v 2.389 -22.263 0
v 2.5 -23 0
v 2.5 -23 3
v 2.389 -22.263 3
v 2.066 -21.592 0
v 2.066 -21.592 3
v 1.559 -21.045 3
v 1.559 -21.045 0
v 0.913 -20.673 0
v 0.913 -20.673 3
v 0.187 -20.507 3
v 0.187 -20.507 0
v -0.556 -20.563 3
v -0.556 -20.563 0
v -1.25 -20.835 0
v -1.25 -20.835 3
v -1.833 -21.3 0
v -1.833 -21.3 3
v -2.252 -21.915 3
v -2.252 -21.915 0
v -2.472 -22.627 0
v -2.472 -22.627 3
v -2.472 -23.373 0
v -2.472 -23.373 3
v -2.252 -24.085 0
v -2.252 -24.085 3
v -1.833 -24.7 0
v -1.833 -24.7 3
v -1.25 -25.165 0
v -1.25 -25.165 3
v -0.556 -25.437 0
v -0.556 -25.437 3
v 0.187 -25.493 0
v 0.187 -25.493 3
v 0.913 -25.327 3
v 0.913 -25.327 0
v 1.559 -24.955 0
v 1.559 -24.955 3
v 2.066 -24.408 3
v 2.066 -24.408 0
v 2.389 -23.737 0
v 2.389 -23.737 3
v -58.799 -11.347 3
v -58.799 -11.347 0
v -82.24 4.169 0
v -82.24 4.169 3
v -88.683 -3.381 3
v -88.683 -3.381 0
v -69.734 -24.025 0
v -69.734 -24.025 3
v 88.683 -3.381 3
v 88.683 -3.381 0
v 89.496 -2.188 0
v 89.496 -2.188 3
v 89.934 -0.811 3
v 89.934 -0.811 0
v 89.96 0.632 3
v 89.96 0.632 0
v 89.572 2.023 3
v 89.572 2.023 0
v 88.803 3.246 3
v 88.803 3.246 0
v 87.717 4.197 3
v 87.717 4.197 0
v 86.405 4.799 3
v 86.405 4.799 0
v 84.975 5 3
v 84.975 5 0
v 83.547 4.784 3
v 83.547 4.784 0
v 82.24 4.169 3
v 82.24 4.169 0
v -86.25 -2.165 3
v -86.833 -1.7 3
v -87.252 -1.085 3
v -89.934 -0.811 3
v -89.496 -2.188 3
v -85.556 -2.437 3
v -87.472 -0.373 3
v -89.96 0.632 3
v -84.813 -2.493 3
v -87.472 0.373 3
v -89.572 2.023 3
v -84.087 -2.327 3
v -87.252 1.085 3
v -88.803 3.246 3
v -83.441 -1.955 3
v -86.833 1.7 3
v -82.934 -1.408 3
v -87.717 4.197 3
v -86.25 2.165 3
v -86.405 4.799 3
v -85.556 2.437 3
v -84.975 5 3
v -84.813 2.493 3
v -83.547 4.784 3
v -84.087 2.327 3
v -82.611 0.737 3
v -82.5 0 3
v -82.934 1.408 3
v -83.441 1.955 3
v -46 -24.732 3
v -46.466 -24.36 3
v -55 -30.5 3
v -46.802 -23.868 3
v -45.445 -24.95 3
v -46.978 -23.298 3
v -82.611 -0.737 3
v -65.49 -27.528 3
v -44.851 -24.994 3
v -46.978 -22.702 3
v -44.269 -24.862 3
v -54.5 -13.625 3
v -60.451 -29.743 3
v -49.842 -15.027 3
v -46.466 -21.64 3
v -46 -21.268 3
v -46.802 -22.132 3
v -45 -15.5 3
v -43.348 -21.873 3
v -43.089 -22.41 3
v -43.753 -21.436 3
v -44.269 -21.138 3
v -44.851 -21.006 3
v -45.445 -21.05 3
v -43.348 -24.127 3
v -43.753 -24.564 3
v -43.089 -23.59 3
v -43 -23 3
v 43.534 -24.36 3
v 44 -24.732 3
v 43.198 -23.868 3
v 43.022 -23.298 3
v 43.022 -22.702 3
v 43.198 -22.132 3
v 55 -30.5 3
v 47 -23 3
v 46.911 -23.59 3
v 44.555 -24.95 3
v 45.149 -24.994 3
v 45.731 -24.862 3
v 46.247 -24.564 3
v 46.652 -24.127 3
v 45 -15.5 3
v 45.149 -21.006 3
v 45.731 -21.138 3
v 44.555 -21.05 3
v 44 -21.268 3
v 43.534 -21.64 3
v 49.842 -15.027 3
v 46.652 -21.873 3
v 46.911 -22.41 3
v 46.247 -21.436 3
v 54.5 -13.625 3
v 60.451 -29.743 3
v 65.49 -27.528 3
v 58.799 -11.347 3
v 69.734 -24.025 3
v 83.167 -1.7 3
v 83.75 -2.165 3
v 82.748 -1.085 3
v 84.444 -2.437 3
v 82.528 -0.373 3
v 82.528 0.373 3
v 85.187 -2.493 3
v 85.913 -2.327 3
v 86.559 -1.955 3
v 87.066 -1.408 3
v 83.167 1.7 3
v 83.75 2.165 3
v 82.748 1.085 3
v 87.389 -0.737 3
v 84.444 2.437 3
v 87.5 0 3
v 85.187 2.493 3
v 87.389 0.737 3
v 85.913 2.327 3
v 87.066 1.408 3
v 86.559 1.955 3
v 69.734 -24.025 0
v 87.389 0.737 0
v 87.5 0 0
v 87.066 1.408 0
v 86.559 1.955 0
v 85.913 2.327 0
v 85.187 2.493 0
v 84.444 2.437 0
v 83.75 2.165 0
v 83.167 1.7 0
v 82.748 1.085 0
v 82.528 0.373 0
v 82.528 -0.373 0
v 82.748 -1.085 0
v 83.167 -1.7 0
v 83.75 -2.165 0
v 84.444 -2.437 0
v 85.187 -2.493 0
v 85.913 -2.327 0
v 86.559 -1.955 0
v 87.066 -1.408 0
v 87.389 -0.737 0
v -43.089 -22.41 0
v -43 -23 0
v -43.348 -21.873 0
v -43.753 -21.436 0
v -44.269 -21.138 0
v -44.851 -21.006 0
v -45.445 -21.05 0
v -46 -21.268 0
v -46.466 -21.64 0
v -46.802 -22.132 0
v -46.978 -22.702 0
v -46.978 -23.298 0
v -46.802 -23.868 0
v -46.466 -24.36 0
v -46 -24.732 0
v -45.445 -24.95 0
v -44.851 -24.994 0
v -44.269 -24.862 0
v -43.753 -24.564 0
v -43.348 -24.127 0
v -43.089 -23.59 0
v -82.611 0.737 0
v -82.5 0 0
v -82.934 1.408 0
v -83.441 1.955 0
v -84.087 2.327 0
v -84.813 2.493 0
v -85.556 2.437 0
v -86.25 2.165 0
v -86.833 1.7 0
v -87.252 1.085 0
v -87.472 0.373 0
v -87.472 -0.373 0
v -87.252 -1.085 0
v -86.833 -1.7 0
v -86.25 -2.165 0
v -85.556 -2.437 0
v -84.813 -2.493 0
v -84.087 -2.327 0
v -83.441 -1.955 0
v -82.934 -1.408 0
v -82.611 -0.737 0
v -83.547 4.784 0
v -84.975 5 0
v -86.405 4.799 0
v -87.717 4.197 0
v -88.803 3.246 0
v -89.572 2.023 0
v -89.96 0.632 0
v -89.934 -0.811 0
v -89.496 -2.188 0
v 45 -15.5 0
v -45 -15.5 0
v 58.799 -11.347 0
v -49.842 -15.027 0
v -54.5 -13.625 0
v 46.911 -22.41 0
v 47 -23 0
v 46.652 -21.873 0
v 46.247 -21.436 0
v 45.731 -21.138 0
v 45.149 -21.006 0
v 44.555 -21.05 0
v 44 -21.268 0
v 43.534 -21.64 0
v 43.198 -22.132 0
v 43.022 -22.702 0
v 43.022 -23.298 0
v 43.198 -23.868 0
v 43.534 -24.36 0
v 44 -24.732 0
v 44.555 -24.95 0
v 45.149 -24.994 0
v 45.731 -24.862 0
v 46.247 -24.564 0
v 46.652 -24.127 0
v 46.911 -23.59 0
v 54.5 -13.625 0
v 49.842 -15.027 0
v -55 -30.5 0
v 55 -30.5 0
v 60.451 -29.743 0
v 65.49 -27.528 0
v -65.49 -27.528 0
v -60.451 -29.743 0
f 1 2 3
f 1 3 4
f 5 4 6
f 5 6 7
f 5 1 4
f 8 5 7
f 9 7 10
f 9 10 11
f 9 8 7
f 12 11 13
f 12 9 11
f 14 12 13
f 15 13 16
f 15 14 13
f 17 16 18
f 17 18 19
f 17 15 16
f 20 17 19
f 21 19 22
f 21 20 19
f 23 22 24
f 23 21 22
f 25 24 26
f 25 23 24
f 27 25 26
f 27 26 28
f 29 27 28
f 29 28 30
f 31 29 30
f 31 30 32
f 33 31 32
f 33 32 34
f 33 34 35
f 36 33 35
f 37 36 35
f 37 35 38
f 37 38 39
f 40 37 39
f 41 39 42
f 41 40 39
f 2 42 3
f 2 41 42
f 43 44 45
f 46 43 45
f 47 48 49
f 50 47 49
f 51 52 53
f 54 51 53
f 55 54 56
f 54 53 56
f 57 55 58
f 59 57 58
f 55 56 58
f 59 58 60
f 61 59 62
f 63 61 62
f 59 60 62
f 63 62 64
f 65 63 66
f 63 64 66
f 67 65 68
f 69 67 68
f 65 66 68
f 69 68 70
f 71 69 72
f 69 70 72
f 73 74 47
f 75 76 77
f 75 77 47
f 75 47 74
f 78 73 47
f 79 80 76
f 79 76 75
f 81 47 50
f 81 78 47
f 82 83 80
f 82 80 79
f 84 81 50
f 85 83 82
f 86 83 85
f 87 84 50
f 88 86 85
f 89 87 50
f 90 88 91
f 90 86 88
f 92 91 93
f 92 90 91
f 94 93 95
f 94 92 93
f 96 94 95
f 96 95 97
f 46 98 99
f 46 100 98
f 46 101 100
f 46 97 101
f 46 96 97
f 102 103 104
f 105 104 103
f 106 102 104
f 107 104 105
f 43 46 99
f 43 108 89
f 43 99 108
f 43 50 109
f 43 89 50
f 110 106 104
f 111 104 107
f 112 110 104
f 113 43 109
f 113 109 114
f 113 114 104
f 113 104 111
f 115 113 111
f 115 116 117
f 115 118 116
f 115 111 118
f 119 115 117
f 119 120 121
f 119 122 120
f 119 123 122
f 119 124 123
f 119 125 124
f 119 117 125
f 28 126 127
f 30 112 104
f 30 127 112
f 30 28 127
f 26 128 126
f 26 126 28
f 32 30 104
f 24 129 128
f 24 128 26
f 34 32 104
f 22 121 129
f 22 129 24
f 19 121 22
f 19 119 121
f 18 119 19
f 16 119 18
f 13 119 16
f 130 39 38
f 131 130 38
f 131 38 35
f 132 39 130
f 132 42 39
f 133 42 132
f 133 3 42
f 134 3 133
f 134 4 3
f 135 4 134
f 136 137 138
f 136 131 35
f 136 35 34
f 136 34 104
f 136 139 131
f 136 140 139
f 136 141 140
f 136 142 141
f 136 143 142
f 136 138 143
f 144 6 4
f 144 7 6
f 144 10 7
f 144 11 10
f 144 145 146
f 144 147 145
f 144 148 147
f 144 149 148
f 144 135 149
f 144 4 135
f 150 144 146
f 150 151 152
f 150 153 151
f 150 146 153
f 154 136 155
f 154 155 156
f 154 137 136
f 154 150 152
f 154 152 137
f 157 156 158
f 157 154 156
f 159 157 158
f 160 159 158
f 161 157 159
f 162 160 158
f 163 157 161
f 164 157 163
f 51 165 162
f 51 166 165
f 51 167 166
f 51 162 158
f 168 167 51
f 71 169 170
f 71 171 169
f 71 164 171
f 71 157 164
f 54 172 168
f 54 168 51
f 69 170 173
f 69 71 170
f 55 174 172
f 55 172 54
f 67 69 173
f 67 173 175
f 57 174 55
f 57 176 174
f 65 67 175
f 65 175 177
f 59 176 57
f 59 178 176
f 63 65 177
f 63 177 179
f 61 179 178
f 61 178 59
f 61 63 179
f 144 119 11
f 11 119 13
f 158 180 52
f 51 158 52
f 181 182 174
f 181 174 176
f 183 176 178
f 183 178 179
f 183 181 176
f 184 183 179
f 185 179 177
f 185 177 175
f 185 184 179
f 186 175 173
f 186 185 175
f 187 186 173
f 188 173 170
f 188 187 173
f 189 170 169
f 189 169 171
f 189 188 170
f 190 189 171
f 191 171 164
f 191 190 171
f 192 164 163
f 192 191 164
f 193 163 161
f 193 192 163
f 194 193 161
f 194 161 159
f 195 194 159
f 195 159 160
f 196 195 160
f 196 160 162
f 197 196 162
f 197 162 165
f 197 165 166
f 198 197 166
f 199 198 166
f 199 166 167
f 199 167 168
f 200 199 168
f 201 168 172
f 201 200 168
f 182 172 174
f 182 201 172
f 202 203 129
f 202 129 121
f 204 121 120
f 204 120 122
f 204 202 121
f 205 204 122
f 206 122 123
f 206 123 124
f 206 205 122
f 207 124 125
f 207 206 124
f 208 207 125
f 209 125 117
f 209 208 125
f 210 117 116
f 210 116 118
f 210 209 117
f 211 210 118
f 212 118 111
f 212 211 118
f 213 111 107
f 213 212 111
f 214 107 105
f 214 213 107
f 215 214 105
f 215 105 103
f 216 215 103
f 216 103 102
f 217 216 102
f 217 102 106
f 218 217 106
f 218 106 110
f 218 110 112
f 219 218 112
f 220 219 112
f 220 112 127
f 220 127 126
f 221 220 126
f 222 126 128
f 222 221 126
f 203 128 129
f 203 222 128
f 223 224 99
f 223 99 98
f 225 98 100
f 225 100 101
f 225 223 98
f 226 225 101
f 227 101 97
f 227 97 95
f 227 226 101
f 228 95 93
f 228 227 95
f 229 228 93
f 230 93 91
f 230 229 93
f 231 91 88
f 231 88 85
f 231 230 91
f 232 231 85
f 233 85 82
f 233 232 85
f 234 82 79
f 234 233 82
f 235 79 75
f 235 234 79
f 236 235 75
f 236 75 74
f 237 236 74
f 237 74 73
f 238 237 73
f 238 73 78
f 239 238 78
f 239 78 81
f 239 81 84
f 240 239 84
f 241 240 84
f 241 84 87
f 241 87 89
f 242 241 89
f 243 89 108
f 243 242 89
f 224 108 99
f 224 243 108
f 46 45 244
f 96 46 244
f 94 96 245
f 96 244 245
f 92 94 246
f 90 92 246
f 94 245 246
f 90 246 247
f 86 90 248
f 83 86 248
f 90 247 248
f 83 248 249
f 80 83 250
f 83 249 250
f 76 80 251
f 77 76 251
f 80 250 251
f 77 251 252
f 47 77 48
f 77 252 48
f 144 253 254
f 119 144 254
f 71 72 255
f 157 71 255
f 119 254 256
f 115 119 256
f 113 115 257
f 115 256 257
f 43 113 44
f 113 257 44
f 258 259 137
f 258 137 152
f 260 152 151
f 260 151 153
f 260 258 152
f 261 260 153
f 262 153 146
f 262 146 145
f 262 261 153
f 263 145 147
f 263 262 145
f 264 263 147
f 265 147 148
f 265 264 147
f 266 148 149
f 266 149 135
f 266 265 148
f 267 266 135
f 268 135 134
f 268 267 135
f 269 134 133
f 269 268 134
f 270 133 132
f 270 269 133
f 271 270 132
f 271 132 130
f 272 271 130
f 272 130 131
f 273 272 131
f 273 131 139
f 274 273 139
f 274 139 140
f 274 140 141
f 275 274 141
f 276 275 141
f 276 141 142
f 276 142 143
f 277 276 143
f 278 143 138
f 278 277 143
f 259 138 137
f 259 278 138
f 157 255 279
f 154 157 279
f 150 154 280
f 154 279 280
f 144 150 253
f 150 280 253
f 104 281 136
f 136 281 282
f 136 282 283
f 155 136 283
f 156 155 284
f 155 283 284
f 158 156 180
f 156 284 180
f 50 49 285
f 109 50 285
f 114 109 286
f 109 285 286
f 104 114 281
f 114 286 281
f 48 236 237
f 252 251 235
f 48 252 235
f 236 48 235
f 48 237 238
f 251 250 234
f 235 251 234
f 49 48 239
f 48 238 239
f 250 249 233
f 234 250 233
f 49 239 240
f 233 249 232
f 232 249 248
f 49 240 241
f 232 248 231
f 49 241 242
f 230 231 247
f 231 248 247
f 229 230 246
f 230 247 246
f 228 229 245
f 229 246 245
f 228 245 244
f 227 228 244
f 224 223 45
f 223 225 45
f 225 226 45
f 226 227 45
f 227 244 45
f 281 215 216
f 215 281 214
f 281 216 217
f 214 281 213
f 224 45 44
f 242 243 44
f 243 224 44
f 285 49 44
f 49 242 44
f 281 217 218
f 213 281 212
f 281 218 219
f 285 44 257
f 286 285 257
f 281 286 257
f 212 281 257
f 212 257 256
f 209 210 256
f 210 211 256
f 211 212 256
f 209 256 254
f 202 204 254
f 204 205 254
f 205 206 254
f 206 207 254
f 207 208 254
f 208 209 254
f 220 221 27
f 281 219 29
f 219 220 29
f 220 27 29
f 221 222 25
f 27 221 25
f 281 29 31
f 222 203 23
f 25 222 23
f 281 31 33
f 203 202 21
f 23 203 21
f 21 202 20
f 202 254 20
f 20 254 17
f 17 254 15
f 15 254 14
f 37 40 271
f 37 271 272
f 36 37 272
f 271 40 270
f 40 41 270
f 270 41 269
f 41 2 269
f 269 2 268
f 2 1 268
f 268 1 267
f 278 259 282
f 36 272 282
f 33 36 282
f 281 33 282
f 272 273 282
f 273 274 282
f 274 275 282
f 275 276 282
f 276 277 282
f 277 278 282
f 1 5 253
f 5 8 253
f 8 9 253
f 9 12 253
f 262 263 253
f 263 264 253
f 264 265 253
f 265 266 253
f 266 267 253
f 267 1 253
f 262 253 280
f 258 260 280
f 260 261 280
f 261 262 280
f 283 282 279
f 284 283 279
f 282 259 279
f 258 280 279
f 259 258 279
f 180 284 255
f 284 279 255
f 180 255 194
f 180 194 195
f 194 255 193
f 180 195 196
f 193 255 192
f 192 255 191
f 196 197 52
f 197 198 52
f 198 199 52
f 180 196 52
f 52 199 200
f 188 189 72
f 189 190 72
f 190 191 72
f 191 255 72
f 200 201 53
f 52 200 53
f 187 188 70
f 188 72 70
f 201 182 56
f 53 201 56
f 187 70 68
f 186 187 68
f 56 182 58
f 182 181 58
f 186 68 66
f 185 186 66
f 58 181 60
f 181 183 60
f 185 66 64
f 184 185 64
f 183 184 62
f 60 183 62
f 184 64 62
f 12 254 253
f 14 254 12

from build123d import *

# Parameters (mm, degrees)
SKETCH_1_R      = 2.5
SKETCH_1_R_2    = 2
EXTRUDE_1_DEPTH = 3


with BuildPart() as part:
    # 草图1 → 凸台-拉伸1 (new body)
    with BuildSketch(Plane.XY):
        with BuildLine():
            Line((-55, -30.5), (0, -30.5))
            Line((0, -30.5), (55, -30.5))
            ThreePointArc((55, -30.5), (63.046888376, -28.809767542), (69.733665561, -24.024758746))
            Line((69.733665561, -24.024758746), (88.68341639, -3.381189686))
            ThreePointArc((88.68341639, -3.381189686), (88.803421515, 3.245610078), (82.240225301, 4.16936969))
            Line((82.240225301, 4.16936969), (58.798873493, -11.346848451))
            ThreePointArc((58.798873493, -11.346848451), (52.205164423, -14.439206454), (45, -15.5))
            Line((45, -15.5), (0, -15.5))
            Line((0, -15.5), (-45, -15.5))
            ThreePointArc((-45, -15.5), (-52.205164423, -14.439206454), (-58.798873493, -11.346848451))
            Line((-58.798873493, -11.346848451), (-82.240225301, 4.16936969))
            ThreePointArc((-82.240225301, 4.16936969), (-88.803421515, 3.245610078), (-88.68341639, -3.381189686))
            Line((-88.68341639, -3.381189686), (-69.733665561, -24.024758746))
            ThreePointArc((-69.733665561, -24.024758746), (-63.046888376, -28.809767542), (-55, -30.5))
        make_face()
        with Locations((85, 0)):
            Circle(SKETCH_1_R, mode=Mode.SUBTRACT)
        with Locations((-85, 0)):
            Circle(SKETCH_1_R, mode=Mode.SUBTRACT)
        with Locations((0, -23)):
            Circle(SKETCH_1_R, mode=Mode.SUBTRACT)
        with Locations((-45, -23)):
            Circle(SKETCH_1_R_2, mode=Mode.SUBTRACT)
        with Locations((45, -23)):
            Circle(SKETCH_1_R_2, mode=Mode.SUBTRACT)
    extrude(amount=EXTRUDE_1_DEPTH)


solid = part.part
